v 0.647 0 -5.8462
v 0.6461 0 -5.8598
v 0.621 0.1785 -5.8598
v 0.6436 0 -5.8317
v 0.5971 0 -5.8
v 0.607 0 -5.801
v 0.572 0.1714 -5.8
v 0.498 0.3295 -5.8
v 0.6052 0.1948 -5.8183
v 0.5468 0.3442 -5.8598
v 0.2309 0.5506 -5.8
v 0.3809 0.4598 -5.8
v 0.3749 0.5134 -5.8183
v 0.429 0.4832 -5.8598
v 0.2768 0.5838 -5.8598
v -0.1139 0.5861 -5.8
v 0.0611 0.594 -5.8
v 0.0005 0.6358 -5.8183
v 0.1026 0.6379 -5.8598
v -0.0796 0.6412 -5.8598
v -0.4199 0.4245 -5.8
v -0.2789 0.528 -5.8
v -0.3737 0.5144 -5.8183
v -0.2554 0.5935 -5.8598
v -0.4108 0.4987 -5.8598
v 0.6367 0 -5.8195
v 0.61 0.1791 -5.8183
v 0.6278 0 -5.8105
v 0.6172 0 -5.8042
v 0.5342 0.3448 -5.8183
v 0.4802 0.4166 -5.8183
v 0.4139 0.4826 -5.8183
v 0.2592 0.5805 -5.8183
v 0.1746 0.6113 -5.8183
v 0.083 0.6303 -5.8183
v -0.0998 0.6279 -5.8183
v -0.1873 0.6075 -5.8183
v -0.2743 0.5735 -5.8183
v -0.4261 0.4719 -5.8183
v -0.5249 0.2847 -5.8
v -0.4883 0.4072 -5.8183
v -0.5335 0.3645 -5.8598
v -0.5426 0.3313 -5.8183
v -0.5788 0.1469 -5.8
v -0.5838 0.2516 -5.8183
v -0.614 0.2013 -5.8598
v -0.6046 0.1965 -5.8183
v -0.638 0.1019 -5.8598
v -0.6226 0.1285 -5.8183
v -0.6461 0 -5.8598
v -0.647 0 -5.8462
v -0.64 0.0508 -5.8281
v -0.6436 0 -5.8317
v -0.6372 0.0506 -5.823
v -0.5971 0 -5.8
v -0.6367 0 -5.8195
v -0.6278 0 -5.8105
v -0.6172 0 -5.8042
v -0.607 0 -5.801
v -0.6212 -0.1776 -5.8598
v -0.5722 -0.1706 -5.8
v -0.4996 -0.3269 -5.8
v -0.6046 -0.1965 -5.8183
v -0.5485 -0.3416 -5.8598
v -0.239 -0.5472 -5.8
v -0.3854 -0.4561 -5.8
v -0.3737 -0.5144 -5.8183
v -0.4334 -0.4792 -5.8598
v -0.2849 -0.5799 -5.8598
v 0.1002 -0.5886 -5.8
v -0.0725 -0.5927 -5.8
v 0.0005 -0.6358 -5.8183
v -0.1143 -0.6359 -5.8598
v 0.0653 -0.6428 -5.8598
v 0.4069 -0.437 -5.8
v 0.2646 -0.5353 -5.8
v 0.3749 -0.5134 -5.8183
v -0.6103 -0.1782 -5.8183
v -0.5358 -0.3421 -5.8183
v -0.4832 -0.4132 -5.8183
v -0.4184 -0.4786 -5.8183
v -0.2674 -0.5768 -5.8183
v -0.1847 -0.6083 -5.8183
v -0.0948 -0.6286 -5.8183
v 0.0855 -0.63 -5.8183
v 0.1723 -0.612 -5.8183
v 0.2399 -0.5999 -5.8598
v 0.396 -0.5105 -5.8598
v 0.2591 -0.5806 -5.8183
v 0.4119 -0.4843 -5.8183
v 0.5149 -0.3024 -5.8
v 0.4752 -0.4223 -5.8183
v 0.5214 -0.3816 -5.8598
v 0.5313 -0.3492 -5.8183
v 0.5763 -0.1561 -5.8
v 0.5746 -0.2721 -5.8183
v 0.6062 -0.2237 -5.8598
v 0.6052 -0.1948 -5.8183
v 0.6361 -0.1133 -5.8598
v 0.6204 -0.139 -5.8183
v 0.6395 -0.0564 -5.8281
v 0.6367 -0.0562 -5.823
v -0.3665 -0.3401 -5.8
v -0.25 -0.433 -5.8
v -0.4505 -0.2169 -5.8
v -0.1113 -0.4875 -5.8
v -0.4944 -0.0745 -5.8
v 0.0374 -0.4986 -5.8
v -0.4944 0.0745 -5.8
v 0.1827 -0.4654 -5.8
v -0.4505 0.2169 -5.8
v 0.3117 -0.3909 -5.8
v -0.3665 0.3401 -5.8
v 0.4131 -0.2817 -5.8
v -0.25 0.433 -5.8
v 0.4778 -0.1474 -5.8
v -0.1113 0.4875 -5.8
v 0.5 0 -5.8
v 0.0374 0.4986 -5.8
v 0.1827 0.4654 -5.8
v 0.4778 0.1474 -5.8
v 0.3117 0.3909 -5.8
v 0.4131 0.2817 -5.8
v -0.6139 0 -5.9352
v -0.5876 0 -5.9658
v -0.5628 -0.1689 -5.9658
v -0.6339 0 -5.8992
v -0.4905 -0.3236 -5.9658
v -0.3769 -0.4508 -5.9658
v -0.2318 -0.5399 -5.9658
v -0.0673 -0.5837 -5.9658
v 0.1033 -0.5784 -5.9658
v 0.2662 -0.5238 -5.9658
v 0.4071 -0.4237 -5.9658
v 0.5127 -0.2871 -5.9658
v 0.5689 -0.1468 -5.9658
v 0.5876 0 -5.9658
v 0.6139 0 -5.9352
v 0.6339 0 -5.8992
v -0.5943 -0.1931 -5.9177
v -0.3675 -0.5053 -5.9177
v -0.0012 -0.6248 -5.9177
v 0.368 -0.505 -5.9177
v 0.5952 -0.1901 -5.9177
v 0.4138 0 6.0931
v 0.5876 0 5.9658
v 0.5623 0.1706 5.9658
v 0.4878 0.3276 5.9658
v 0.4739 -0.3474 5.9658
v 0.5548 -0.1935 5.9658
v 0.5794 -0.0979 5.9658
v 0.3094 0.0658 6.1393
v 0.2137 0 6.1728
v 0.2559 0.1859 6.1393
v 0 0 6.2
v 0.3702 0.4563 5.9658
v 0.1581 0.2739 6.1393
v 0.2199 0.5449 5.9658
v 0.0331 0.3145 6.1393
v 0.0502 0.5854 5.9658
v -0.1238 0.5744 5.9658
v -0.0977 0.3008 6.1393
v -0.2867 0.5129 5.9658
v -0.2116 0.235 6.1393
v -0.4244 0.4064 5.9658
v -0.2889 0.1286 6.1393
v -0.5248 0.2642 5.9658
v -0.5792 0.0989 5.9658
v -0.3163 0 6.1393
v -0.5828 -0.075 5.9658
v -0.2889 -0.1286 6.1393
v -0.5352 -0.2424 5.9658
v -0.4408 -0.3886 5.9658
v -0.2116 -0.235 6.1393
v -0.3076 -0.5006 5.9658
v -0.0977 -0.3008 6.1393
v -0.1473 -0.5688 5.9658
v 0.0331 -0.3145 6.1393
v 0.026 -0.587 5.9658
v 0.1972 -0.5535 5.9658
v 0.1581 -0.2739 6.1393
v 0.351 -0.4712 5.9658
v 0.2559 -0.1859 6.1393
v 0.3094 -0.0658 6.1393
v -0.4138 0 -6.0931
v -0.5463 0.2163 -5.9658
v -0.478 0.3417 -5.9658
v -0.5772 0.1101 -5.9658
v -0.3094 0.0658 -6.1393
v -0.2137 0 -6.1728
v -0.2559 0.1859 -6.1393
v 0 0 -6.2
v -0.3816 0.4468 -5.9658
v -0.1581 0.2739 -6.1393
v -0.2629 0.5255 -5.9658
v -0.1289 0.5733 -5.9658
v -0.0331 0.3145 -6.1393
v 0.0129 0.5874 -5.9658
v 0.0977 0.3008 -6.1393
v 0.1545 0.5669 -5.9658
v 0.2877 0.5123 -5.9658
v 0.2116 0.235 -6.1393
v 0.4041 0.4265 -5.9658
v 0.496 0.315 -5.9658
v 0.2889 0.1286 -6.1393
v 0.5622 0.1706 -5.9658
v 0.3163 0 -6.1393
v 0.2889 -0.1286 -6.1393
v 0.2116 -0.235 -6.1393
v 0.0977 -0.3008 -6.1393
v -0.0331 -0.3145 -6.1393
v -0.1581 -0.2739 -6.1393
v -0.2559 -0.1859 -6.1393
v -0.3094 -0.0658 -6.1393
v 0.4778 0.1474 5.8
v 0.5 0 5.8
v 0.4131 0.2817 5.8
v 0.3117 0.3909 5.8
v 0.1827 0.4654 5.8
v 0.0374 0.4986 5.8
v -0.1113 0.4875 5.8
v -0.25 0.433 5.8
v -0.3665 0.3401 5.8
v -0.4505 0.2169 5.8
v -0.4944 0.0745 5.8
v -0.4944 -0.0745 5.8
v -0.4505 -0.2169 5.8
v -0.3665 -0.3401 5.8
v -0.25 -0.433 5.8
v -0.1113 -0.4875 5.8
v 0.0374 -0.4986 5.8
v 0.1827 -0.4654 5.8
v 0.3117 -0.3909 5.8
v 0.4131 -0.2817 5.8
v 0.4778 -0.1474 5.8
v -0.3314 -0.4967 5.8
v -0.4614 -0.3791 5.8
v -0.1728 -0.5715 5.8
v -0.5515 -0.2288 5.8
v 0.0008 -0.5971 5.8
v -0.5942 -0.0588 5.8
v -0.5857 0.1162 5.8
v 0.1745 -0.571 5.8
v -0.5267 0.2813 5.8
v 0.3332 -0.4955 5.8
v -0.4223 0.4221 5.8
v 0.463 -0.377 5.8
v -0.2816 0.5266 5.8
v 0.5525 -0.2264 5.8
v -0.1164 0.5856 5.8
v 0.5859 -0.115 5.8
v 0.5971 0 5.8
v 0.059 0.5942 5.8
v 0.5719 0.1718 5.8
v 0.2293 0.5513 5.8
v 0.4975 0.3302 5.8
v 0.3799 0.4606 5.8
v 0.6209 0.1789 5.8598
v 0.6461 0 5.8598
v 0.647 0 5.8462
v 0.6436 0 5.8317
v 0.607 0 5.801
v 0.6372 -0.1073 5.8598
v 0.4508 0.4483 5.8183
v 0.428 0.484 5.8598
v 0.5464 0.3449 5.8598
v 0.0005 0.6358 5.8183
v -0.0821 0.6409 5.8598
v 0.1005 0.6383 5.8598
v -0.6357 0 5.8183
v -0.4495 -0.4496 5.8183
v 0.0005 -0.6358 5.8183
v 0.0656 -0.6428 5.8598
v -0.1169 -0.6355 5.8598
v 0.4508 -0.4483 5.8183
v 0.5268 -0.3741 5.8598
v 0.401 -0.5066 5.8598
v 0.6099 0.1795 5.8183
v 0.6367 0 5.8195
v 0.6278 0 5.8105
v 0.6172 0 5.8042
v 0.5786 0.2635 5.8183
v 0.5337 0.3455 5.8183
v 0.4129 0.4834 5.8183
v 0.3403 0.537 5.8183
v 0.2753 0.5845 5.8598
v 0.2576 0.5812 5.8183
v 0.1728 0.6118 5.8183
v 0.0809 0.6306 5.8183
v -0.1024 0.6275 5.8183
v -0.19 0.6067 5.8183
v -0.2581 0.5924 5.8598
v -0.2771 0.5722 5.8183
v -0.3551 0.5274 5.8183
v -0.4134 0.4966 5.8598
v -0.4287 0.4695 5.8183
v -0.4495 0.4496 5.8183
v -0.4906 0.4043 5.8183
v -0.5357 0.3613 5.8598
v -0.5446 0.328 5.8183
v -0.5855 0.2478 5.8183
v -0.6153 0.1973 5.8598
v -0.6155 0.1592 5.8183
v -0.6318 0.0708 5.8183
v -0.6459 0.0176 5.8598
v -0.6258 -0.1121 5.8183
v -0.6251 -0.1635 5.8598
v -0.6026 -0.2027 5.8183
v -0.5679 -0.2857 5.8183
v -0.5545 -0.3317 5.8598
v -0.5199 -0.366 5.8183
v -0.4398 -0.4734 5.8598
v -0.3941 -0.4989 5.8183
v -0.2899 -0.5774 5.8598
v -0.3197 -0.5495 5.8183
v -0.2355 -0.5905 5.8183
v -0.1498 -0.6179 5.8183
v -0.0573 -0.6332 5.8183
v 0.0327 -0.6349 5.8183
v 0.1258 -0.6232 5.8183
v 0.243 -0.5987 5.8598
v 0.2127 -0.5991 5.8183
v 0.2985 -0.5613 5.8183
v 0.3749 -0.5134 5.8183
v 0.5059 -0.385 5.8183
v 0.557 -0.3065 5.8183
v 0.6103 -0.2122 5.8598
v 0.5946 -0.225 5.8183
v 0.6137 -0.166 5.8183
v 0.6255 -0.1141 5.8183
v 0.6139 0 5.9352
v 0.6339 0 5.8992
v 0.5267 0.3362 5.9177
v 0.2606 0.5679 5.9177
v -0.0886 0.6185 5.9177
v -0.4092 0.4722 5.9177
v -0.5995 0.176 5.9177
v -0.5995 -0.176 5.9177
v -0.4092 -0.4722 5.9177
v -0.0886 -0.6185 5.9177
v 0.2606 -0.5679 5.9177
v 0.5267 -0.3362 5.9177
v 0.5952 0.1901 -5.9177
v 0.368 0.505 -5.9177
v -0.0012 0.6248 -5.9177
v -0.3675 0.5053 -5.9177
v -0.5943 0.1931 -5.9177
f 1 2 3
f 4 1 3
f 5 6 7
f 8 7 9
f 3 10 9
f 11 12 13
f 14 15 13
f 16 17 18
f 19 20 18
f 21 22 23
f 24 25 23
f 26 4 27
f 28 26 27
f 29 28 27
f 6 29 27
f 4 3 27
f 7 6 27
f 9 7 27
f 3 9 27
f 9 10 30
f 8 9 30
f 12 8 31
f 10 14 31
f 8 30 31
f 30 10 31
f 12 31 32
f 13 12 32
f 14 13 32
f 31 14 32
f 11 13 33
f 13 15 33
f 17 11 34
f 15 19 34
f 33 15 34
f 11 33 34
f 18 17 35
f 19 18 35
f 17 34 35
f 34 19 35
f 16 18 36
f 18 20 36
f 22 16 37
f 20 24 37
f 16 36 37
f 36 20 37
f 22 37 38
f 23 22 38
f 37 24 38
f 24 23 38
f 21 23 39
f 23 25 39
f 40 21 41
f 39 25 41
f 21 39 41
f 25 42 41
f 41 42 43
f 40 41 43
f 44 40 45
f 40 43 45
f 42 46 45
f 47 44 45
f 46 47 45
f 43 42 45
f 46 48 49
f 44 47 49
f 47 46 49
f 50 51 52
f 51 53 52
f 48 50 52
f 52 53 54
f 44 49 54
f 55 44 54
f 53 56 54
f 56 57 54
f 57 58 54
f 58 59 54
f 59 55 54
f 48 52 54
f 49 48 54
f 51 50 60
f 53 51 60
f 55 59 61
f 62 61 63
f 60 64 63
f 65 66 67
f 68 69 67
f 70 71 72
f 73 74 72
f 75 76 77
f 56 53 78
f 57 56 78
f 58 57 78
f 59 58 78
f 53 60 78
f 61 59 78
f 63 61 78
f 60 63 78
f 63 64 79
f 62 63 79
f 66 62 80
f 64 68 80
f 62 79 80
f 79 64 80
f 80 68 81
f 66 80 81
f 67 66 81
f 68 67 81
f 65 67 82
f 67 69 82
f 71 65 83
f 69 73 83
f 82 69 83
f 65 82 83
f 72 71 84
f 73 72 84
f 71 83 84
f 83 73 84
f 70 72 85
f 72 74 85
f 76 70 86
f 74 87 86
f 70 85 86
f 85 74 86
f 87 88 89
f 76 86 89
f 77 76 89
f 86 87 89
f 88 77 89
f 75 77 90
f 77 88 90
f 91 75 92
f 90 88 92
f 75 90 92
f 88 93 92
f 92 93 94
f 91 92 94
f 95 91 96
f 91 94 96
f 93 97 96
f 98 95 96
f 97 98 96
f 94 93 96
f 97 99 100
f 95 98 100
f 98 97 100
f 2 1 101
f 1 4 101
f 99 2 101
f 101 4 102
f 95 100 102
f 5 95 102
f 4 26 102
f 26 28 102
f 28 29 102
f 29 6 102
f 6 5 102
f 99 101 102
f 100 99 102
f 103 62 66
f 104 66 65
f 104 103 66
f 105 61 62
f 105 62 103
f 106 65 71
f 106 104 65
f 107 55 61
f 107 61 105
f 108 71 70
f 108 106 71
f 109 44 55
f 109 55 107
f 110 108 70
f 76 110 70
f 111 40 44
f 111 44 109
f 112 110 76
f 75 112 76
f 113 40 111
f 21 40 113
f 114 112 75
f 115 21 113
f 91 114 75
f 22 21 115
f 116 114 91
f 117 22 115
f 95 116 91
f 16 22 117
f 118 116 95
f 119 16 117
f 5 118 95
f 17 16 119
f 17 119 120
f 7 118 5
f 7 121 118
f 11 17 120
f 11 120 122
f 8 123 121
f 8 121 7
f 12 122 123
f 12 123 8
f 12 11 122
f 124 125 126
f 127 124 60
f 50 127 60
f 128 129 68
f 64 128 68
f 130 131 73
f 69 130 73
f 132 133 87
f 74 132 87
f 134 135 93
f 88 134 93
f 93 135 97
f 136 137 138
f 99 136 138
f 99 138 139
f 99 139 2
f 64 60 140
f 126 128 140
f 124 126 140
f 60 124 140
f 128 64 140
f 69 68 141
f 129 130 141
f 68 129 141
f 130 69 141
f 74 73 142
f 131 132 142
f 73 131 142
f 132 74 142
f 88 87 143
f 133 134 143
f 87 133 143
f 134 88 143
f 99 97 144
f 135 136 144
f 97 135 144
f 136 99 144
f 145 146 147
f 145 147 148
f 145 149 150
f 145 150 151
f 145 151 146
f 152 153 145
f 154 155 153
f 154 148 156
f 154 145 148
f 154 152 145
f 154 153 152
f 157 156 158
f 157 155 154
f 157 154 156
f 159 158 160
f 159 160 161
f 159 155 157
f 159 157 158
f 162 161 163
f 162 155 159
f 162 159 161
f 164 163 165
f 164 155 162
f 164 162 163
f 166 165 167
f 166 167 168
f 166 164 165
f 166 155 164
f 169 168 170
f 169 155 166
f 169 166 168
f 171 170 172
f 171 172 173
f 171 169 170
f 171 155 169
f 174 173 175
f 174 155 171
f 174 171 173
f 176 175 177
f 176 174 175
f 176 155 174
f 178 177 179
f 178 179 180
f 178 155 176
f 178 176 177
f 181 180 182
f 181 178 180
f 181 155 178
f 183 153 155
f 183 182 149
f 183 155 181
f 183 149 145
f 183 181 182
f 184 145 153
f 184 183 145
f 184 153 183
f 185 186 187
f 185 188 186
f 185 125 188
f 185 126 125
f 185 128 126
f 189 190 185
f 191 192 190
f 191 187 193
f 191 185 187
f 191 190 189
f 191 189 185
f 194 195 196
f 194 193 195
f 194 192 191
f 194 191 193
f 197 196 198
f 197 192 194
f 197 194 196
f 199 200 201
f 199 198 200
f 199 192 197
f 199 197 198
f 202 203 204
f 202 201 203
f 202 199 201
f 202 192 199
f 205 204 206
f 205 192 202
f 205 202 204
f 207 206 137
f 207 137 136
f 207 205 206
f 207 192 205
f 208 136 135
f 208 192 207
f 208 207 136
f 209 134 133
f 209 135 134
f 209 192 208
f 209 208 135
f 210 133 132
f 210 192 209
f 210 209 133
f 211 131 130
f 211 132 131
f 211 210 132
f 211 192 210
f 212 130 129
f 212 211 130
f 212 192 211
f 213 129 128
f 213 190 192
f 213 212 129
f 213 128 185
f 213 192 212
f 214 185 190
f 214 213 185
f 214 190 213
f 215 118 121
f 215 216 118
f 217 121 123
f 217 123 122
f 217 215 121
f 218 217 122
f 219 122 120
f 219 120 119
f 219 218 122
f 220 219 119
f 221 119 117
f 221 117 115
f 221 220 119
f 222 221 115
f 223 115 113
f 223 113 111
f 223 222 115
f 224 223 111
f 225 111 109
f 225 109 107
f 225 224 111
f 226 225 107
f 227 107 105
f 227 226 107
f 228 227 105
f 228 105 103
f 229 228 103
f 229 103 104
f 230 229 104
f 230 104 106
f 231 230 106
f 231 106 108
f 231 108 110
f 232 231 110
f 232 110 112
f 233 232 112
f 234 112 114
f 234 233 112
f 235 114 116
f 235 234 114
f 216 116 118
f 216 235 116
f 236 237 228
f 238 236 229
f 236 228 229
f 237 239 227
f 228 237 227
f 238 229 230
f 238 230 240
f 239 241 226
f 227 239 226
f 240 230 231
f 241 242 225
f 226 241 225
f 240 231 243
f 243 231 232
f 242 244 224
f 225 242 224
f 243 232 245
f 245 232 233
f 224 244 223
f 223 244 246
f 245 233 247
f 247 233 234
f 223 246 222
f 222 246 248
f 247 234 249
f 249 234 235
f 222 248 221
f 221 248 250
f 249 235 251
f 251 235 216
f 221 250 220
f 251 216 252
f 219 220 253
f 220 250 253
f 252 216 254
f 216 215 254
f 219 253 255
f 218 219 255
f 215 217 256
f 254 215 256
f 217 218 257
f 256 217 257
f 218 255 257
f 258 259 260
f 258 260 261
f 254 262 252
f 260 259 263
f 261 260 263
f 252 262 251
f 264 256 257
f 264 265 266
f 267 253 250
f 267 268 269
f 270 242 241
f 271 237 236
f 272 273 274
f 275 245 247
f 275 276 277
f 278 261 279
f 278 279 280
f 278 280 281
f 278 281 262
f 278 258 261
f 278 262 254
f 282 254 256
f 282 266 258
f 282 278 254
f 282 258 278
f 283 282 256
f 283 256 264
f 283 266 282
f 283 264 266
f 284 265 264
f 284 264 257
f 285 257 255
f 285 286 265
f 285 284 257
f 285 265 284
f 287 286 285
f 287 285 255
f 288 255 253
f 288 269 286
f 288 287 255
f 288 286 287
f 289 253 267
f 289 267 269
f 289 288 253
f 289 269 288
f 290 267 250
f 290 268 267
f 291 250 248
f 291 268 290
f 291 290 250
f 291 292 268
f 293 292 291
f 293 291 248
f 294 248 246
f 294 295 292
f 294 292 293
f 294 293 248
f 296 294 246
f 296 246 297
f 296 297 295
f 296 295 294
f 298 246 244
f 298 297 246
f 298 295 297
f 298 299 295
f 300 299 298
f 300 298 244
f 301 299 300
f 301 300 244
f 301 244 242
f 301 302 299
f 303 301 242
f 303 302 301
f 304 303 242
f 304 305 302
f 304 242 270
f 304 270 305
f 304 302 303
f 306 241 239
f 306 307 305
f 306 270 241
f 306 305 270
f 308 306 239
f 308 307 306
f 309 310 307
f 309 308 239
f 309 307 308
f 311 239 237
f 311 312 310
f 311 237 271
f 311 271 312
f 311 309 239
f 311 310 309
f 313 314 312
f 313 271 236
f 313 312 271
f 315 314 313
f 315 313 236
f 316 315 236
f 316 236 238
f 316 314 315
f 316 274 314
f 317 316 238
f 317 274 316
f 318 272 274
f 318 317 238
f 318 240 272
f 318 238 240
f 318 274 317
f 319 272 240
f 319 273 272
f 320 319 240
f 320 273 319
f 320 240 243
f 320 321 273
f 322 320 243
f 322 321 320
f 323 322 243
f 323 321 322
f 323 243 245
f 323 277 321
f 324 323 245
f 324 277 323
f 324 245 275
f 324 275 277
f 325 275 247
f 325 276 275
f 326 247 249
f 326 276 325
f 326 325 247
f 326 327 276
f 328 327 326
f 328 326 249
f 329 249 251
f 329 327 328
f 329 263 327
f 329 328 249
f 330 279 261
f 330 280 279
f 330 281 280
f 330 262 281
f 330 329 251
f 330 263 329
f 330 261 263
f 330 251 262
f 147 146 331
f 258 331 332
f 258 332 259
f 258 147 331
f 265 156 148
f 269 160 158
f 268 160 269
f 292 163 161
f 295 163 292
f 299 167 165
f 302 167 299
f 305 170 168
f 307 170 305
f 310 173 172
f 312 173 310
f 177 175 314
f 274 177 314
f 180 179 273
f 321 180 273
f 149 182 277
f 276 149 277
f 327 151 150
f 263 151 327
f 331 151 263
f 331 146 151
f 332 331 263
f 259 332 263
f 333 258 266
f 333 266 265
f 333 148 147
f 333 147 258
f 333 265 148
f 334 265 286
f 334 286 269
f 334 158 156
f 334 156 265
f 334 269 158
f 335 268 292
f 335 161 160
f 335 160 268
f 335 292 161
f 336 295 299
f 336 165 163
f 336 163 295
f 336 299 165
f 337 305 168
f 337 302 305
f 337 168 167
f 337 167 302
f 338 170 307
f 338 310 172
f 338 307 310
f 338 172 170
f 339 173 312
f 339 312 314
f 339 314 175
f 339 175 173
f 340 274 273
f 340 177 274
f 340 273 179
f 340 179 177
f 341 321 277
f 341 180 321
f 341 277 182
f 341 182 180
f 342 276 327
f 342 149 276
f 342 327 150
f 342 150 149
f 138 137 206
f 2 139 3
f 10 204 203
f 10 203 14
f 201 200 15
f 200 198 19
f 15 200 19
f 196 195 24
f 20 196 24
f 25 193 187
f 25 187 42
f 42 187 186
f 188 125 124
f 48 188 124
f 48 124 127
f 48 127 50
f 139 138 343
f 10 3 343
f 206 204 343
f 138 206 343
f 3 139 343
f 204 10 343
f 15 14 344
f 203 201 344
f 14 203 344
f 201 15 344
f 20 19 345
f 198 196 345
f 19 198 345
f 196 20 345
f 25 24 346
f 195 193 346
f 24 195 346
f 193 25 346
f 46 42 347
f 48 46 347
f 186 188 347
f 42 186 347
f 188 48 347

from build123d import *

# Parameters (mm, degrees)
SKETCH1_R                  = 0.5
BOSS_EXTRUDE1_DEPTH        = 5.8
SKETCH2_R                  = 0.65
BOSS_EXTRUDE2_DEPTH        = 0.1
DOME1_FACE_RADIUS          = 0.65
DOME1_HEIGHT               = 0.3
FILLET1_R                  = 0.2
FILLET3_R                  = 0.05
MIRROR2_COPY_1_FACE_RADIUS = 0.65
MIRROR2_COPY_1_HEIGHT      = 0.3
FILLET1_OF_MIRROR2_R       = 0.2
FILLET3_OF_MIRROR2_R       = 0.05


with BuildPart() as part:
    # Sketch1 → Boss-Extrude1 (new, symmetric)
    with BuildSketch(Plane.XY):
        Circle(SKETCH1_R)
    extrude(amount=BOSS_EXTRUDE1_DEPTH, both=True)

    # Sketch2 → Boss-Extrude2 (add)
    with BuildSketch(Plane.XY.offset(5.8)):
        Circle(SKETCH2_R)
    boss_extrude2 = extrude(amount=BOSS_EXTRUDE2_DEPTH)

    # Dome1: a dome of height H over a round flat face of radius A is a cap of a sphere of radius (A * A + H * H) / (2 * H)
    dome1_r = (DOME1_FACE_RADIUS * DOME1_FACE_RADIUS + DOME1_HEIGHT * DOME1_HEIGHT) / (2 * DOME1_HEIGHT)
    dome1_base = Plane((0, 0, 5.9), z_dir=(0, 0, 1))
    with Locations(dome1_base.offset(DOME1_HEIGHT - dome1_r)):
        dome1_ball = Sphere(dome1_r, mode=Mode.PRIVATE)
    add(split(dome1_ball, bisect_by=dome1_base, keep=Keep.TOP, mode=Mode.PRIVATE))

    # Fillet1
    fillet1_edges = [part.edges().sort_by_distance(p)[0] for p in [
        (-0.65, 0, 5.9),
    ]]
    fillet(fillet1_edges, radius=FILLET1_R)

    # Fillet3
    fillet3_edges = [part.edges().sort_by_distance(p)[0] for p in [
        (-0.65, 0, 5.8),
    ]]
    fillet(fillet3_edges, radius=FILLET3_R)

    # Mirror2: Boss-Extrude2 across plane
    add(boss_extrude2.mirror(Plane.XY))

    # Mirror2 copy 1: a dome of height H over a round flat face of radius A is a cap of a sphere of radius (A * A + H * H) / (2 * H)
    mirror2_copy_1_r = (MIRROR2_COPY_1_FACE_RADIUS * MIRROR2_COPY_1_FACE_RADIUS + MIRROR2_COPY_1_HEIGHT * MIRROR2_COPY_1_HEIGHT) / (2 * MIRROR2_COPY_1_HEIGHT)
    mirror2_copy_1_base = Plane((0, 0, -5.9), z_dir=(0, 0, -1))
    with Locations(mirror2_copy_1_base.offset(MIRROR2_COPY_1_HEIGHT - mirror2_copy_1_r)):
        mirror2_copy_1_ball = Sphere(mirror2_copy_1_r, mode=Mode.PRIVATE)
    add(split(mirror2_copy_1_ball, bisect_by=mirror2_copy_1_base, keep=Keep.TOP, mode=Mode.PRIVATE))

    # Fillet1 of Mirror2
    fillet1_of_mirror2_edges = [part.edges().sort_by_distance(p)[0] for p in [
        (-0.65, 0, -5.9),
    ]]
    fillet(fillet1_of_mirror2_edges, radius=FILLET1_OF_MIRROR2_R)

    # Fillet3 of Mirror2
    fillet3_of_mirror2_edges = [part.edges().sort_by_distance(p)[0] for p in [
        (-0.65, 0, -5.8),
    ]]
    fillet(fillet3_of_mirror2_edges, radius=FILLET3_OF_MIRROR2_R)


solid = part.part
